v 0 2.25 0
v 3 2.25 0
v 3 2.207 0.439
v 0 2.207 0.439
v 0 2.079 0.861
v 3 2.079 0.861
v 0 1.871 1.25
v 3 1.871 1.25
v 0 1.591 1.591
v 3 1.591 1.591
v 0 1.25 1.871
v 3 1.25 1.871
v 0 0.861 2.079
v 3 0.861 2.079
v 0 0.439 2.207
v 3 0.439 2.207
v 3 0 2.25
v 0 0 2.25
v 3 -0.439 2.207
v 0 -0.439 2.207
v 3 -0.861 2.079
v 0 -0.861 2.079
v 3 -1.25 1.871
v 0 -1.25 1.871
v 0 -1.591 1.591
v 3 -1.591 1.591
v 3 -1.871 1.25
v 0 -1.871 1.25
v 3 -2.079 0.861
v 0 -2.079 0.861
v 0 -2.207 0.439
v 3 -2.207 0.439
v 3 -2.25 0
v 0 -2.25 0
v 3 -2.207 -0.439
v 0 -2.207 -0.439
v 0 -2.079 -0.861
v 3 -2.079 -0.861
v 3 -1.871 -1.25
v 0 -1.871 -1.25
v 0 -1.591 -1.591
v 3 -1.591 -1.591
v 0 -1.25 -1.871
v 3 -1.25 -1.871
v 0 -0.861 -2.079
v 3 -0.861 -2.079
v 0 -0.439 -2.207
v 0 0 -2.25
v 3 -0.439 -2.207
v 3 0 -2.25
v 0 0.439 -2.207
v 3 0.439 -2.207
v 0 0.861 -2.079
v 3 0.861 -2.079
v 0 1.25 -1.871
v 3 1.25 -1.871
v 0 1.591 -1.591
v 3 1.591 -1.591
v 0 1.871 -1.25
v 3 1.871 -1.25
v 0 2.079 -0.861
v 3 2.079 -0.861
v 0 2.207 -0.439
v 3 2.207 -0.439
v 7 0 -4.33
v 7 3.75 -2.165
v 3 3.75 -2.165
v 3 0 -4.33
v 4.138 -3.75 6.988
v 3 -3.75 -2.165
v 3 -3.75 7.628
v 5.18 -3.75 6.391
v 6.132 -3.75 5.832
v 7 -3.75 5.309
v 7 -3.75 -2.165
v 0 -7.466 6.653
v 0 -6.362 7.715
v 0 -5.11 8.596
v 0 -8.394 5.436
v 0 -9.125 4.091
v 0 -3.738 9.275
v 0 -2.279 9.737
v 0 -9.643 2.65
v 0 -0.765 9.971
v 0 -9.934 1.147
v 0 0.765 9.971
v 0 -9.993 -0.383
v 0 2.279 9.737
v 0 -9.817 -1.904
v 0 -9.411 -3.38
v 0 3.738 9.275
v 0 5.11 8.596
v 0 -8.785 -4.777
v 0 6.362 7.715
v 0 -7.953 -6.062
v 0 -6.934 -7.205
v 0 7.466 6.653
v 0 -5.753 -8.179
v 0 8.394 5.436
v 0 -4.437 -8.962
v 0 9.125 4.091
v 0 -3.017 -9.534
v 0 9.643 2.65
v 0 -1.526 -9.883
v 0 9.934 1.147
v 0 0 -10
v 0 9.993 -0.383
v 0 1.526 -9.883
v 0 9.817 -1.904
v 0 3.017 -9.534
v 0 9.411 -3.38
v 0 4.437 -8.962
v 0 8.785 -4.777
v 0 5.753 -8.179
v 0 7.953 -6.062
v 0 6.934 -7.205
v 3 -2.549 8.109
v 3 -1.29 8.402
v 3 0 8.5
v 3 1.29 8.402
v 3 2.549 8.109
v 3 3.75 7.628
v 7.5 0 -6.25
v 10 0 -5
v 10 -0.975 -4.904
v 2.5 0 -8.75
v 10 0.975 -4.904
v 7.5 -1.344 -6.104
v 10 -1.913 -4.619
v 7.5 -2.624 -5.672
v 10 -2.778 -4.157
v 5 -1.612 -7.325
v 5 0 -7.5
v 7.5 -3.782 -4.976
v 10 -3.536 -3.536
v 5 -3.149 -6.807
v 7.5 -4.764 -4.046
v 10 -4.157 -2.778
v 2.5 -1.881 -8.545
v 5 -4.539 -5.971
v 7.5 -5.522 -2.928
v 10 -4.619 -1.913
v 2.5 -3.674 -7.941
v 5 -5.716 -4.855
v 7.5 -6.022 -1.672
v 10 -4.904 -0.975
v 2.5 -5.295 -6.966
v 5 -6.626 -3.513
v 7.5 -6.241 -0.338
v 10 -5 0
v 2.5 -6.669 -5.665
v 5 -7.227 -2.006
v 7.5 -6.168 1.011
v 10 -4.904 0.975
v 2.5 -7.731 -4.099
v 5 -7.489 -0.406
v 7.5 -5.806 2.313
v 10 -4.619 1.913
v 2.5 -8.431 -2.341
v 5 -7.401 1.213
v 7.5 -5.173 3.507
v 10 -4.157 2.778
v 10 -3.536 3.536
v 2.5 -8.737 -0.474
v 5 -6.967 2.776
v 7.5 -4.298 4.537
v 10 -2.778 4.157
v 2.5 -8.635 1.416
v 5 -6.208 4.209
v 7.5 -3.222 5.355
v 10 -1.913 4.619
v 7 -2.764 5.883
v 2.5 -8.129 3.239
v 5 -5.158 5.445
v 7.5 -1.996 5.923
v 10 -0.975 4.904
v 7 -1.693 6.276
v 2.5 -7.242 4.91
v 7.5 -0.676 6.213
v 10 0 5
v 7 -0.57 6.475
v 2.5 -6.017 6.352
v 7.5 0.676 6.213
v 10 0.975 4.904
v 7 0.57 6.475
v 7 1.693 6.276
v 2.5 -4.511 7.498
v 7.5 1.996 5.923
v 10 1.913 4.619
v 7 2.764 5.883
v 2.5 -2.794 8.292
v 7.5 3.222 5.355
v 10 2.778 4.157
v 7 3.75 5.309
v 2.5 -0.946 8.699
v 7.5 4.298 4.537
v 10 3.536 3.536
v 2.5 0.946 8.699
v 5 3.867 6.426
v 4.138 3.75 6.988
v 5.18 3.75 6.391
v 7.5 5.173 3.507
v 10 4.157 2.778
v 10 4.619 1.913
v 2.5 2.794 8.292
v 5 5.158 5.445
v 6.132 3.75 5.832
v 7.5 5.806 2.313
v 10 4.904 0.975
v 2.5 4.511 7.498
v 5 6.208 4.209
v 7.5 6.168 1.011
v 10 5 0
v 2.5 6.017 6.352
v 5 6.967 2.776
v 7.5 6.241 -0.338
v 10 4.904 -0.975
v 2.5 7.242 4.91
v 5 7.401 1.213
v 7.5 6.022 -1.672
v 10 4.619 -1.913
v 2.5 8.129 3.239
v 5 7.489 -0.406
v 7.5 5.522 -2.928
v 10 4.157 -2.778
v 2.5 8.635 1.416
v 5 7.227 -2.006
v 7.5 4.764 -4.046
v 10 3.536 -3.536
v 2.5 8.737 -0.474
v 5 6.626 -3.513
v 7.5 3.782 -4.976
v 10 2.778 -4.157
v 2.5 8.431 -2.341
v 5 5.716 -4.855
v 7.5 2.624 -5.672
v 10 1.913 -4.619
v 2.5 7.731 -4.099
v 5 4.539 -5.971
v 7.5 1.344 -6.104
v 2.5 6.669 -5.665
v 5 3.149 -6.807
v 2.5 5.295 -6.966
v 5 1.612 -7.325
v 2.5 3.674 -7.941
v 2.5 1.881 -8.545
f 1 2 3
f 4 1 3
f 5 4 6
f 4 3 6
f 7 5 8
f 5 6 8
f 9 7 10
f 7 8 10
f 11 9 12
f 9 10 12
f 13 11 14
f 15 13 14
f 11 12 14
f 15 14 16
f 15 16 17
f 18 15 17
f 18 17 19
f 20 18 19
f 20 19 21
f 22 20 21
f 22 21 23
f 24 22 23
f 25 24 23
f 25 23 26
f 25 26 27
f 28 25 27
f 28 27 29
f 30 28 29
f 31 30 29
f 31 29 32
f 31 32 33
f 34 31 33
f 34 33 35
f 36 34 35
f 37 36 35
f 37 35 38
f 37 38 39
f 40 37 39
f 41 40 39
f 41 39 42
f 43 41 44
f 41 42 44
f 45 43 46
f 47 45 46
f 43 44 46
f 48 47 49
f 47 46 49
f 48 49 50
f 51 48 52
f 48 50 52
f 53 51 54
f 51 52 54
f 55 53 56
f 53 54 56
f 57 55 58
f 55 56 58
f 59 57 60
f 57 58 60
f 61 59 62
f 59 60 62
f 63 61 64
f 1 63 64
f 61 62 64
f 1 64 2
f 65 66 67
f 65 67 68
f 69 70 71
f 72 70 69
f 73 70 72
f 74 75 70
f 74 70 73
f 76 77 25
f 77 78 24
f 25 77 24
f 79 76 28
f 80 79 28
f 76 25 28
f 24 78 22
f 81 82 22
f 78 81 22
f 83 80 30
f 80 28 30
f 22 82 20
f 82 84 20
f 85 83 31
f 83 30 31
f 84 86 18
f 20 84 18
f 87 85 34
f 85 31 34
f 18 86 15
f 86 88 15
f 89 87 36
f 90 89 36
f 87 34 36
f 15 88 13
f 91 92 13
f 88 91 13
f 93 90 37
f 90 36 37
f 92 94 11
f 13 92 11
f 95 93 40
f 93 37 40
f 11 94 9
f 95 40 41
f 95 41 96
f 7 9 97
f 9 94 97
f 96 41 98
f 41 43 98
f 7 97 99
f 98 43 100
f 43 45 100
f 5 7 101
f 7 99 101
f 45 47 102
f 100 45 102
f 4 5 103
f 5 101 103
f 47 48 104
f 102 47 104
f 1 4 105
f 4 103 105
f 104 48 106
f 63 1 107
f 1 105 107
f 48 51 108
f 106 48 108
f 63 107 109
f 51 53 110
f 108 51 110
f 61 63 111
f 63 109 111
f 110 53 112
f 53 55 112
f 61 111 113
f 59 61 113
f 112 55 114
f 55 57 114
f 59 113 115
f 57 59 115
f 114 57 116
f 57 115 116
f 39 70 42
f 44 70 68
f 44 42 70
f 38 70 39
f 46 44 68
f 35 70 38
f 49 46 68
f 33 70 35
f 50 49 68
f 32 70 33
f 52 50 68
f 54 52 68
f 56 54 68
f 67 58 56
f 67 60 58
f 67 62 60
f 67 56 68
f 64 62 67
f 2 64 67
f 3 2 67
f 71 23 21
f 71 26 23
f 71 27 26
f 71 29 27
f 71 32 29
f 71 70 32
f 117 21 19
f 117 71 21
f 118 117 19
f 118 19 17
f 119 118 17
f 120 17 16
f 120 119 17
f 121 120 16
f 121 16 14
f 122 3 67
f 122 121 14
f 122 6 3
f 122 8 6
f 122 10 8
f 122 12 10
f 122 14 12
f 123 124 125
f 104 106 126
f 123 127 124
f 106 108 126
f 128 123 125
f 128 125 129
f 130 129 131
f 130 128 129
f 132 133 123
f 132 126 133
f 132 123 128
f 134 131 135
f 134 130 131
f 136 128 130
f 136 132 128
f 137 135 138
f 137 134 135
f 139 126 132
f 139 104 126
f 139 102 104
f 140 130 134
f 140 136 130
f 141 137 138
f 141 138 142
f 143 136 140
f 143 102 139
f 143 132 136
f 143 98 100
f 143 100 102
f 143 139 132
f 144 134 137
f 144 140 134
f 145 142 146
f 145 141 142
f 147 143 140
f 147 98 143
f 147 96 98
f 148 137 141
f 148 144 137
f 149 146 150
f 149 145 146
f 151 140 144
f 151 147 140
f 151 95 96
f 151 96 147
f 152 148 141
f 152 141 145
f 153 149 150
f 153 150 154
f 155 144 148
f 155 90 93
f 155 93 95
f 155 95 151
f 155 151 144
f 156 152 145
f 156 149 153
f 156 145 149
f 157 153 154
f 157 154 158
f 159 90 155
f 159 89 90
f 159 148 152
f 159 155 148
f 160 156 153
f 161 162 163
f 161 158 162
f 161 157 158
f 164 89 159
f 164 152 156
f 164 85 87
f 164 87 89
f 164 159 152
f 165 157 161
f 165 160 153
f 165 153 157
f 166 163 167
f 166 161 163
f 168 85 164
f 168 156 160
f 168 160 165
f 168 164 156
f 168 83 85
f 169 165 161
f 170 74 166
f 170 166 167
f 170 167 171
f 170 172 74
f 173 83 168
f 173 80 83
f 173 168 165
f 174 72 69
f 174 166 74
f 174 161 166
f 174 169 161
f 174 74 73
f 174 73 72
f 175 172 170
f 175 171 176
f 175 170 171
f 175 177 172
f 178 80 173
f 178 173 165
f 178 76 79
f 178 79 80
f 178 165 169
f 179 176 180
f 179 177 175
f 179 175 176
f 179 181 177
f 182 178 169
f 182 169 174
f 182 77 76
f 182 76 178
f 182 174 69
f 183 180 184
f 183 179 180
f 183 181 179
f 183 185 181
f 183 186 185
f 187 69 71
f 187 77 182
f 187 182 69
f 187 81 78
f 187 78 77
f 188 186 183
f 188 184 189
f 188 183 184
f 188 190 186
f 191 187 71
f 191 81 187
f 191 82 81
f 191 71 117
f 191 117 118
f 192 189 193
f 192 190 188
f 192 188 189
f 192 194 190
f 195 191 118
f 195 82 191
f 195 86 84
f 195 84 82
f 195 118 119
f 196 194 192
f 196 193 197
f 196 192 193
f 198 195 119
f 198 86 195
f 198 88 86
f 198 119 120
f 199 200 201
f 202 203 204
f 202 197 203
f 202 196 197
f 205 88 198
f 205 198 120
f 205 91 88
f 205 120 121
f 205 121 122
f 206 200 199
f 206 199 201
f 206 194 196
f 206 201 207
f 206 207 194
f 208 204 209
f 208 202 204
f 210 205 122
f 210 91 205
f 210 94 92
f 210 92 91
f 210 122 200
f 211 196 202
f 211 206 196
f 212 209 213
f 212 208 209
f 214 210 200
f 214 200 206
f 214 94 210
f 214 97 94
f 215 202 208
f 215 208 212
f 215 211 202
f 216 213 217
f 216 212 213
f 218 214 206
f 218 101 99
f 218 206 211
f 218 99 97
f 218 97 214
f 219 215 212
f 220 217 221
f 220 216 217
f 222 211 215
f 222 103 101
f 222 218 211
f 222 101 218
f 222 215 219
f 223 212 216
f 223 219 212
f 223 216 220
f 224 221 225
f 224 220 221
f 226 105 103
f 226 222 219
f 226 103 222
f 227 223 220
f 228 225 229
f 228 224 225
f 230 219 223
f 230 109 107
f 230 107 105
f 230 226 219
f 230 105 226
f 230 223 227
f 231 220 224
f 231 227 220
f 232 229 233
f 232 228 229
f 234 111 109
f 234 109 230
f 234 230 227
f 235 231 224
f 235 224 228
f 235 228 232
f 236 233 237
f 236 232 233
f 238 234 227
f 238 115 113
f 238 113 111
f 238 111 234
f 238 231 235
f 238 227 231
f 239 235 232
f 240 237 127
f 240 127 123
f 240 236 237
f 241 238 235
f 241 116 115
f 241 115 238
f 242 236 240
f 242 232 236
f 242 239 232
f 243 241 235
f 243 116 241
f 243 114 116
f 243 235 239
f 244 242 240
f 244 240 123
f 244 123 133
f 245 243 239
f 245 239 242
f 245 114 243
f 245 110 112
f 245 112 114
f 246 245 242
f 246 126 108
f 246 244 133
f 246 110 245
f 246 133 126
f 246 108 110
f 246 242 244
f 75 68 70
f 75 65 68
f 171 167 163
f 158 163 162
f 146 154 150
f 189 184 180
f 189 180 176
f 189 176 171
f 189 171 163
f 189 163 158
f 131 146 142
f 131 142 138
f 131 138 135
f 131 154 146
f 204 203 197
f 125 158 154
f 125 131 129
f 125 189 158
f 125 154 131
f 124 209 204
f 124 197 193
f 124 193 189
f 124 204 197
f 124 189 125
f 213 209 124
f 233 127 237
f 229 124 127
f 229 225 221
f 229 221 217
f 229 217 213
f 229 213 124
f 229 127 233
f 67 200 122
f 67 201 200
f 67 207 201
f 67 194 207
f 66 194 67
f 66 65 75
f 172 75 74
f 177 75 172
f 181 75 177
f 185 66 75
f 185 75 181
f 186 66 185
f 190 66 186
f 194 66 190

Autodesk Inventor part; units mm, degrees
ref_plane "XZ Plane" through (0, 0, 0) normal (0, 1, 0) x (-1, 0, 0)
ref_plane "XY Plane" through (0, 0, 0) normal (0, 0, 1) x (1, 0, 0)
ref_plane "Work Plane1" through (7, 0, 0) normal (1, 0, 0) x (0, 1, 0)
sketch "Sketch1" plane through (0, 0, 0) normal (0, 1, 0) x (-1, 0, 0)
  line L0 (0, 0) -> (-10, 0)
  line L1 (0, 0) -> (0, -10)
  line L2 (-10, 0) -> (-10, -5)
  line L3 (-10, -5) -> (0, -10)
  dimension "d0" = 10
  dimension "d1" = 10
  dimension "d2" = 5
revolve "Revolution1" add sketch "Sketch1" angle 360 about axis through (0, 0, 0) along (1, 0, 0)
sketch "Sketch2" plane through (7, 0, 0) normal (1, 0, 0) x (0, 1, 0)
  circle A0 centre (0, 0) radius 2.25
  dimension "d5" = 4.5
extrude "Extrusion1" cut sketch "Sketch2" along normal blind 2 and the other way blind 10
sketch "Sketch3" plane through (7, 0, 0) normal (1, 0, 0) x (0, 1, 0)
  line L0 (0, 0) -> (3.75, 0)
  line L1 (3.75, -2.1651) -> (0, -4.3301)
  line L2 (0, -4.3301) -> (-3.75, -2.1651)
  line L3 (-3.75, -2.1651) -> (-3.75, 2.1651)
  line L4 (-3.75, 2.1651) -> (0, 4.3301)
  line L5 (0, 4.3301) -> (3.75, 2.1651)
  line L6 (3.75, 2.1651) -> (3.75, -2.1651)
  line L7 (-3.75, 14.6203) -> (-3.75, 2.1651)
  line L8 (-3.75, 14.6203) -> (3.75, 14.6203)
  line L9 (3.75, 14.6203) -> (3.75, 1.2022)
  line L10 (3.75, 1.2022) -> (-3.75, 1.2022)
  line L11 (-3.75, 1.2022) -> (-3.75, 14.6203)
  dimension "d15" = 3.75
extrude "Extrusion2" cut sketch "Sketch3" against normal blind 4
sketch "Sketch5" plane through (9, 0, 0) normal (-1, 0, 0) x (0, 0, 1)
  circle A0 centre (0, 0) radius 2.25 projected
extrude "Extrusion3" add sketch "Sketch5" along normal up to surface (2 mm away)
properties part number "stollen_m4"
